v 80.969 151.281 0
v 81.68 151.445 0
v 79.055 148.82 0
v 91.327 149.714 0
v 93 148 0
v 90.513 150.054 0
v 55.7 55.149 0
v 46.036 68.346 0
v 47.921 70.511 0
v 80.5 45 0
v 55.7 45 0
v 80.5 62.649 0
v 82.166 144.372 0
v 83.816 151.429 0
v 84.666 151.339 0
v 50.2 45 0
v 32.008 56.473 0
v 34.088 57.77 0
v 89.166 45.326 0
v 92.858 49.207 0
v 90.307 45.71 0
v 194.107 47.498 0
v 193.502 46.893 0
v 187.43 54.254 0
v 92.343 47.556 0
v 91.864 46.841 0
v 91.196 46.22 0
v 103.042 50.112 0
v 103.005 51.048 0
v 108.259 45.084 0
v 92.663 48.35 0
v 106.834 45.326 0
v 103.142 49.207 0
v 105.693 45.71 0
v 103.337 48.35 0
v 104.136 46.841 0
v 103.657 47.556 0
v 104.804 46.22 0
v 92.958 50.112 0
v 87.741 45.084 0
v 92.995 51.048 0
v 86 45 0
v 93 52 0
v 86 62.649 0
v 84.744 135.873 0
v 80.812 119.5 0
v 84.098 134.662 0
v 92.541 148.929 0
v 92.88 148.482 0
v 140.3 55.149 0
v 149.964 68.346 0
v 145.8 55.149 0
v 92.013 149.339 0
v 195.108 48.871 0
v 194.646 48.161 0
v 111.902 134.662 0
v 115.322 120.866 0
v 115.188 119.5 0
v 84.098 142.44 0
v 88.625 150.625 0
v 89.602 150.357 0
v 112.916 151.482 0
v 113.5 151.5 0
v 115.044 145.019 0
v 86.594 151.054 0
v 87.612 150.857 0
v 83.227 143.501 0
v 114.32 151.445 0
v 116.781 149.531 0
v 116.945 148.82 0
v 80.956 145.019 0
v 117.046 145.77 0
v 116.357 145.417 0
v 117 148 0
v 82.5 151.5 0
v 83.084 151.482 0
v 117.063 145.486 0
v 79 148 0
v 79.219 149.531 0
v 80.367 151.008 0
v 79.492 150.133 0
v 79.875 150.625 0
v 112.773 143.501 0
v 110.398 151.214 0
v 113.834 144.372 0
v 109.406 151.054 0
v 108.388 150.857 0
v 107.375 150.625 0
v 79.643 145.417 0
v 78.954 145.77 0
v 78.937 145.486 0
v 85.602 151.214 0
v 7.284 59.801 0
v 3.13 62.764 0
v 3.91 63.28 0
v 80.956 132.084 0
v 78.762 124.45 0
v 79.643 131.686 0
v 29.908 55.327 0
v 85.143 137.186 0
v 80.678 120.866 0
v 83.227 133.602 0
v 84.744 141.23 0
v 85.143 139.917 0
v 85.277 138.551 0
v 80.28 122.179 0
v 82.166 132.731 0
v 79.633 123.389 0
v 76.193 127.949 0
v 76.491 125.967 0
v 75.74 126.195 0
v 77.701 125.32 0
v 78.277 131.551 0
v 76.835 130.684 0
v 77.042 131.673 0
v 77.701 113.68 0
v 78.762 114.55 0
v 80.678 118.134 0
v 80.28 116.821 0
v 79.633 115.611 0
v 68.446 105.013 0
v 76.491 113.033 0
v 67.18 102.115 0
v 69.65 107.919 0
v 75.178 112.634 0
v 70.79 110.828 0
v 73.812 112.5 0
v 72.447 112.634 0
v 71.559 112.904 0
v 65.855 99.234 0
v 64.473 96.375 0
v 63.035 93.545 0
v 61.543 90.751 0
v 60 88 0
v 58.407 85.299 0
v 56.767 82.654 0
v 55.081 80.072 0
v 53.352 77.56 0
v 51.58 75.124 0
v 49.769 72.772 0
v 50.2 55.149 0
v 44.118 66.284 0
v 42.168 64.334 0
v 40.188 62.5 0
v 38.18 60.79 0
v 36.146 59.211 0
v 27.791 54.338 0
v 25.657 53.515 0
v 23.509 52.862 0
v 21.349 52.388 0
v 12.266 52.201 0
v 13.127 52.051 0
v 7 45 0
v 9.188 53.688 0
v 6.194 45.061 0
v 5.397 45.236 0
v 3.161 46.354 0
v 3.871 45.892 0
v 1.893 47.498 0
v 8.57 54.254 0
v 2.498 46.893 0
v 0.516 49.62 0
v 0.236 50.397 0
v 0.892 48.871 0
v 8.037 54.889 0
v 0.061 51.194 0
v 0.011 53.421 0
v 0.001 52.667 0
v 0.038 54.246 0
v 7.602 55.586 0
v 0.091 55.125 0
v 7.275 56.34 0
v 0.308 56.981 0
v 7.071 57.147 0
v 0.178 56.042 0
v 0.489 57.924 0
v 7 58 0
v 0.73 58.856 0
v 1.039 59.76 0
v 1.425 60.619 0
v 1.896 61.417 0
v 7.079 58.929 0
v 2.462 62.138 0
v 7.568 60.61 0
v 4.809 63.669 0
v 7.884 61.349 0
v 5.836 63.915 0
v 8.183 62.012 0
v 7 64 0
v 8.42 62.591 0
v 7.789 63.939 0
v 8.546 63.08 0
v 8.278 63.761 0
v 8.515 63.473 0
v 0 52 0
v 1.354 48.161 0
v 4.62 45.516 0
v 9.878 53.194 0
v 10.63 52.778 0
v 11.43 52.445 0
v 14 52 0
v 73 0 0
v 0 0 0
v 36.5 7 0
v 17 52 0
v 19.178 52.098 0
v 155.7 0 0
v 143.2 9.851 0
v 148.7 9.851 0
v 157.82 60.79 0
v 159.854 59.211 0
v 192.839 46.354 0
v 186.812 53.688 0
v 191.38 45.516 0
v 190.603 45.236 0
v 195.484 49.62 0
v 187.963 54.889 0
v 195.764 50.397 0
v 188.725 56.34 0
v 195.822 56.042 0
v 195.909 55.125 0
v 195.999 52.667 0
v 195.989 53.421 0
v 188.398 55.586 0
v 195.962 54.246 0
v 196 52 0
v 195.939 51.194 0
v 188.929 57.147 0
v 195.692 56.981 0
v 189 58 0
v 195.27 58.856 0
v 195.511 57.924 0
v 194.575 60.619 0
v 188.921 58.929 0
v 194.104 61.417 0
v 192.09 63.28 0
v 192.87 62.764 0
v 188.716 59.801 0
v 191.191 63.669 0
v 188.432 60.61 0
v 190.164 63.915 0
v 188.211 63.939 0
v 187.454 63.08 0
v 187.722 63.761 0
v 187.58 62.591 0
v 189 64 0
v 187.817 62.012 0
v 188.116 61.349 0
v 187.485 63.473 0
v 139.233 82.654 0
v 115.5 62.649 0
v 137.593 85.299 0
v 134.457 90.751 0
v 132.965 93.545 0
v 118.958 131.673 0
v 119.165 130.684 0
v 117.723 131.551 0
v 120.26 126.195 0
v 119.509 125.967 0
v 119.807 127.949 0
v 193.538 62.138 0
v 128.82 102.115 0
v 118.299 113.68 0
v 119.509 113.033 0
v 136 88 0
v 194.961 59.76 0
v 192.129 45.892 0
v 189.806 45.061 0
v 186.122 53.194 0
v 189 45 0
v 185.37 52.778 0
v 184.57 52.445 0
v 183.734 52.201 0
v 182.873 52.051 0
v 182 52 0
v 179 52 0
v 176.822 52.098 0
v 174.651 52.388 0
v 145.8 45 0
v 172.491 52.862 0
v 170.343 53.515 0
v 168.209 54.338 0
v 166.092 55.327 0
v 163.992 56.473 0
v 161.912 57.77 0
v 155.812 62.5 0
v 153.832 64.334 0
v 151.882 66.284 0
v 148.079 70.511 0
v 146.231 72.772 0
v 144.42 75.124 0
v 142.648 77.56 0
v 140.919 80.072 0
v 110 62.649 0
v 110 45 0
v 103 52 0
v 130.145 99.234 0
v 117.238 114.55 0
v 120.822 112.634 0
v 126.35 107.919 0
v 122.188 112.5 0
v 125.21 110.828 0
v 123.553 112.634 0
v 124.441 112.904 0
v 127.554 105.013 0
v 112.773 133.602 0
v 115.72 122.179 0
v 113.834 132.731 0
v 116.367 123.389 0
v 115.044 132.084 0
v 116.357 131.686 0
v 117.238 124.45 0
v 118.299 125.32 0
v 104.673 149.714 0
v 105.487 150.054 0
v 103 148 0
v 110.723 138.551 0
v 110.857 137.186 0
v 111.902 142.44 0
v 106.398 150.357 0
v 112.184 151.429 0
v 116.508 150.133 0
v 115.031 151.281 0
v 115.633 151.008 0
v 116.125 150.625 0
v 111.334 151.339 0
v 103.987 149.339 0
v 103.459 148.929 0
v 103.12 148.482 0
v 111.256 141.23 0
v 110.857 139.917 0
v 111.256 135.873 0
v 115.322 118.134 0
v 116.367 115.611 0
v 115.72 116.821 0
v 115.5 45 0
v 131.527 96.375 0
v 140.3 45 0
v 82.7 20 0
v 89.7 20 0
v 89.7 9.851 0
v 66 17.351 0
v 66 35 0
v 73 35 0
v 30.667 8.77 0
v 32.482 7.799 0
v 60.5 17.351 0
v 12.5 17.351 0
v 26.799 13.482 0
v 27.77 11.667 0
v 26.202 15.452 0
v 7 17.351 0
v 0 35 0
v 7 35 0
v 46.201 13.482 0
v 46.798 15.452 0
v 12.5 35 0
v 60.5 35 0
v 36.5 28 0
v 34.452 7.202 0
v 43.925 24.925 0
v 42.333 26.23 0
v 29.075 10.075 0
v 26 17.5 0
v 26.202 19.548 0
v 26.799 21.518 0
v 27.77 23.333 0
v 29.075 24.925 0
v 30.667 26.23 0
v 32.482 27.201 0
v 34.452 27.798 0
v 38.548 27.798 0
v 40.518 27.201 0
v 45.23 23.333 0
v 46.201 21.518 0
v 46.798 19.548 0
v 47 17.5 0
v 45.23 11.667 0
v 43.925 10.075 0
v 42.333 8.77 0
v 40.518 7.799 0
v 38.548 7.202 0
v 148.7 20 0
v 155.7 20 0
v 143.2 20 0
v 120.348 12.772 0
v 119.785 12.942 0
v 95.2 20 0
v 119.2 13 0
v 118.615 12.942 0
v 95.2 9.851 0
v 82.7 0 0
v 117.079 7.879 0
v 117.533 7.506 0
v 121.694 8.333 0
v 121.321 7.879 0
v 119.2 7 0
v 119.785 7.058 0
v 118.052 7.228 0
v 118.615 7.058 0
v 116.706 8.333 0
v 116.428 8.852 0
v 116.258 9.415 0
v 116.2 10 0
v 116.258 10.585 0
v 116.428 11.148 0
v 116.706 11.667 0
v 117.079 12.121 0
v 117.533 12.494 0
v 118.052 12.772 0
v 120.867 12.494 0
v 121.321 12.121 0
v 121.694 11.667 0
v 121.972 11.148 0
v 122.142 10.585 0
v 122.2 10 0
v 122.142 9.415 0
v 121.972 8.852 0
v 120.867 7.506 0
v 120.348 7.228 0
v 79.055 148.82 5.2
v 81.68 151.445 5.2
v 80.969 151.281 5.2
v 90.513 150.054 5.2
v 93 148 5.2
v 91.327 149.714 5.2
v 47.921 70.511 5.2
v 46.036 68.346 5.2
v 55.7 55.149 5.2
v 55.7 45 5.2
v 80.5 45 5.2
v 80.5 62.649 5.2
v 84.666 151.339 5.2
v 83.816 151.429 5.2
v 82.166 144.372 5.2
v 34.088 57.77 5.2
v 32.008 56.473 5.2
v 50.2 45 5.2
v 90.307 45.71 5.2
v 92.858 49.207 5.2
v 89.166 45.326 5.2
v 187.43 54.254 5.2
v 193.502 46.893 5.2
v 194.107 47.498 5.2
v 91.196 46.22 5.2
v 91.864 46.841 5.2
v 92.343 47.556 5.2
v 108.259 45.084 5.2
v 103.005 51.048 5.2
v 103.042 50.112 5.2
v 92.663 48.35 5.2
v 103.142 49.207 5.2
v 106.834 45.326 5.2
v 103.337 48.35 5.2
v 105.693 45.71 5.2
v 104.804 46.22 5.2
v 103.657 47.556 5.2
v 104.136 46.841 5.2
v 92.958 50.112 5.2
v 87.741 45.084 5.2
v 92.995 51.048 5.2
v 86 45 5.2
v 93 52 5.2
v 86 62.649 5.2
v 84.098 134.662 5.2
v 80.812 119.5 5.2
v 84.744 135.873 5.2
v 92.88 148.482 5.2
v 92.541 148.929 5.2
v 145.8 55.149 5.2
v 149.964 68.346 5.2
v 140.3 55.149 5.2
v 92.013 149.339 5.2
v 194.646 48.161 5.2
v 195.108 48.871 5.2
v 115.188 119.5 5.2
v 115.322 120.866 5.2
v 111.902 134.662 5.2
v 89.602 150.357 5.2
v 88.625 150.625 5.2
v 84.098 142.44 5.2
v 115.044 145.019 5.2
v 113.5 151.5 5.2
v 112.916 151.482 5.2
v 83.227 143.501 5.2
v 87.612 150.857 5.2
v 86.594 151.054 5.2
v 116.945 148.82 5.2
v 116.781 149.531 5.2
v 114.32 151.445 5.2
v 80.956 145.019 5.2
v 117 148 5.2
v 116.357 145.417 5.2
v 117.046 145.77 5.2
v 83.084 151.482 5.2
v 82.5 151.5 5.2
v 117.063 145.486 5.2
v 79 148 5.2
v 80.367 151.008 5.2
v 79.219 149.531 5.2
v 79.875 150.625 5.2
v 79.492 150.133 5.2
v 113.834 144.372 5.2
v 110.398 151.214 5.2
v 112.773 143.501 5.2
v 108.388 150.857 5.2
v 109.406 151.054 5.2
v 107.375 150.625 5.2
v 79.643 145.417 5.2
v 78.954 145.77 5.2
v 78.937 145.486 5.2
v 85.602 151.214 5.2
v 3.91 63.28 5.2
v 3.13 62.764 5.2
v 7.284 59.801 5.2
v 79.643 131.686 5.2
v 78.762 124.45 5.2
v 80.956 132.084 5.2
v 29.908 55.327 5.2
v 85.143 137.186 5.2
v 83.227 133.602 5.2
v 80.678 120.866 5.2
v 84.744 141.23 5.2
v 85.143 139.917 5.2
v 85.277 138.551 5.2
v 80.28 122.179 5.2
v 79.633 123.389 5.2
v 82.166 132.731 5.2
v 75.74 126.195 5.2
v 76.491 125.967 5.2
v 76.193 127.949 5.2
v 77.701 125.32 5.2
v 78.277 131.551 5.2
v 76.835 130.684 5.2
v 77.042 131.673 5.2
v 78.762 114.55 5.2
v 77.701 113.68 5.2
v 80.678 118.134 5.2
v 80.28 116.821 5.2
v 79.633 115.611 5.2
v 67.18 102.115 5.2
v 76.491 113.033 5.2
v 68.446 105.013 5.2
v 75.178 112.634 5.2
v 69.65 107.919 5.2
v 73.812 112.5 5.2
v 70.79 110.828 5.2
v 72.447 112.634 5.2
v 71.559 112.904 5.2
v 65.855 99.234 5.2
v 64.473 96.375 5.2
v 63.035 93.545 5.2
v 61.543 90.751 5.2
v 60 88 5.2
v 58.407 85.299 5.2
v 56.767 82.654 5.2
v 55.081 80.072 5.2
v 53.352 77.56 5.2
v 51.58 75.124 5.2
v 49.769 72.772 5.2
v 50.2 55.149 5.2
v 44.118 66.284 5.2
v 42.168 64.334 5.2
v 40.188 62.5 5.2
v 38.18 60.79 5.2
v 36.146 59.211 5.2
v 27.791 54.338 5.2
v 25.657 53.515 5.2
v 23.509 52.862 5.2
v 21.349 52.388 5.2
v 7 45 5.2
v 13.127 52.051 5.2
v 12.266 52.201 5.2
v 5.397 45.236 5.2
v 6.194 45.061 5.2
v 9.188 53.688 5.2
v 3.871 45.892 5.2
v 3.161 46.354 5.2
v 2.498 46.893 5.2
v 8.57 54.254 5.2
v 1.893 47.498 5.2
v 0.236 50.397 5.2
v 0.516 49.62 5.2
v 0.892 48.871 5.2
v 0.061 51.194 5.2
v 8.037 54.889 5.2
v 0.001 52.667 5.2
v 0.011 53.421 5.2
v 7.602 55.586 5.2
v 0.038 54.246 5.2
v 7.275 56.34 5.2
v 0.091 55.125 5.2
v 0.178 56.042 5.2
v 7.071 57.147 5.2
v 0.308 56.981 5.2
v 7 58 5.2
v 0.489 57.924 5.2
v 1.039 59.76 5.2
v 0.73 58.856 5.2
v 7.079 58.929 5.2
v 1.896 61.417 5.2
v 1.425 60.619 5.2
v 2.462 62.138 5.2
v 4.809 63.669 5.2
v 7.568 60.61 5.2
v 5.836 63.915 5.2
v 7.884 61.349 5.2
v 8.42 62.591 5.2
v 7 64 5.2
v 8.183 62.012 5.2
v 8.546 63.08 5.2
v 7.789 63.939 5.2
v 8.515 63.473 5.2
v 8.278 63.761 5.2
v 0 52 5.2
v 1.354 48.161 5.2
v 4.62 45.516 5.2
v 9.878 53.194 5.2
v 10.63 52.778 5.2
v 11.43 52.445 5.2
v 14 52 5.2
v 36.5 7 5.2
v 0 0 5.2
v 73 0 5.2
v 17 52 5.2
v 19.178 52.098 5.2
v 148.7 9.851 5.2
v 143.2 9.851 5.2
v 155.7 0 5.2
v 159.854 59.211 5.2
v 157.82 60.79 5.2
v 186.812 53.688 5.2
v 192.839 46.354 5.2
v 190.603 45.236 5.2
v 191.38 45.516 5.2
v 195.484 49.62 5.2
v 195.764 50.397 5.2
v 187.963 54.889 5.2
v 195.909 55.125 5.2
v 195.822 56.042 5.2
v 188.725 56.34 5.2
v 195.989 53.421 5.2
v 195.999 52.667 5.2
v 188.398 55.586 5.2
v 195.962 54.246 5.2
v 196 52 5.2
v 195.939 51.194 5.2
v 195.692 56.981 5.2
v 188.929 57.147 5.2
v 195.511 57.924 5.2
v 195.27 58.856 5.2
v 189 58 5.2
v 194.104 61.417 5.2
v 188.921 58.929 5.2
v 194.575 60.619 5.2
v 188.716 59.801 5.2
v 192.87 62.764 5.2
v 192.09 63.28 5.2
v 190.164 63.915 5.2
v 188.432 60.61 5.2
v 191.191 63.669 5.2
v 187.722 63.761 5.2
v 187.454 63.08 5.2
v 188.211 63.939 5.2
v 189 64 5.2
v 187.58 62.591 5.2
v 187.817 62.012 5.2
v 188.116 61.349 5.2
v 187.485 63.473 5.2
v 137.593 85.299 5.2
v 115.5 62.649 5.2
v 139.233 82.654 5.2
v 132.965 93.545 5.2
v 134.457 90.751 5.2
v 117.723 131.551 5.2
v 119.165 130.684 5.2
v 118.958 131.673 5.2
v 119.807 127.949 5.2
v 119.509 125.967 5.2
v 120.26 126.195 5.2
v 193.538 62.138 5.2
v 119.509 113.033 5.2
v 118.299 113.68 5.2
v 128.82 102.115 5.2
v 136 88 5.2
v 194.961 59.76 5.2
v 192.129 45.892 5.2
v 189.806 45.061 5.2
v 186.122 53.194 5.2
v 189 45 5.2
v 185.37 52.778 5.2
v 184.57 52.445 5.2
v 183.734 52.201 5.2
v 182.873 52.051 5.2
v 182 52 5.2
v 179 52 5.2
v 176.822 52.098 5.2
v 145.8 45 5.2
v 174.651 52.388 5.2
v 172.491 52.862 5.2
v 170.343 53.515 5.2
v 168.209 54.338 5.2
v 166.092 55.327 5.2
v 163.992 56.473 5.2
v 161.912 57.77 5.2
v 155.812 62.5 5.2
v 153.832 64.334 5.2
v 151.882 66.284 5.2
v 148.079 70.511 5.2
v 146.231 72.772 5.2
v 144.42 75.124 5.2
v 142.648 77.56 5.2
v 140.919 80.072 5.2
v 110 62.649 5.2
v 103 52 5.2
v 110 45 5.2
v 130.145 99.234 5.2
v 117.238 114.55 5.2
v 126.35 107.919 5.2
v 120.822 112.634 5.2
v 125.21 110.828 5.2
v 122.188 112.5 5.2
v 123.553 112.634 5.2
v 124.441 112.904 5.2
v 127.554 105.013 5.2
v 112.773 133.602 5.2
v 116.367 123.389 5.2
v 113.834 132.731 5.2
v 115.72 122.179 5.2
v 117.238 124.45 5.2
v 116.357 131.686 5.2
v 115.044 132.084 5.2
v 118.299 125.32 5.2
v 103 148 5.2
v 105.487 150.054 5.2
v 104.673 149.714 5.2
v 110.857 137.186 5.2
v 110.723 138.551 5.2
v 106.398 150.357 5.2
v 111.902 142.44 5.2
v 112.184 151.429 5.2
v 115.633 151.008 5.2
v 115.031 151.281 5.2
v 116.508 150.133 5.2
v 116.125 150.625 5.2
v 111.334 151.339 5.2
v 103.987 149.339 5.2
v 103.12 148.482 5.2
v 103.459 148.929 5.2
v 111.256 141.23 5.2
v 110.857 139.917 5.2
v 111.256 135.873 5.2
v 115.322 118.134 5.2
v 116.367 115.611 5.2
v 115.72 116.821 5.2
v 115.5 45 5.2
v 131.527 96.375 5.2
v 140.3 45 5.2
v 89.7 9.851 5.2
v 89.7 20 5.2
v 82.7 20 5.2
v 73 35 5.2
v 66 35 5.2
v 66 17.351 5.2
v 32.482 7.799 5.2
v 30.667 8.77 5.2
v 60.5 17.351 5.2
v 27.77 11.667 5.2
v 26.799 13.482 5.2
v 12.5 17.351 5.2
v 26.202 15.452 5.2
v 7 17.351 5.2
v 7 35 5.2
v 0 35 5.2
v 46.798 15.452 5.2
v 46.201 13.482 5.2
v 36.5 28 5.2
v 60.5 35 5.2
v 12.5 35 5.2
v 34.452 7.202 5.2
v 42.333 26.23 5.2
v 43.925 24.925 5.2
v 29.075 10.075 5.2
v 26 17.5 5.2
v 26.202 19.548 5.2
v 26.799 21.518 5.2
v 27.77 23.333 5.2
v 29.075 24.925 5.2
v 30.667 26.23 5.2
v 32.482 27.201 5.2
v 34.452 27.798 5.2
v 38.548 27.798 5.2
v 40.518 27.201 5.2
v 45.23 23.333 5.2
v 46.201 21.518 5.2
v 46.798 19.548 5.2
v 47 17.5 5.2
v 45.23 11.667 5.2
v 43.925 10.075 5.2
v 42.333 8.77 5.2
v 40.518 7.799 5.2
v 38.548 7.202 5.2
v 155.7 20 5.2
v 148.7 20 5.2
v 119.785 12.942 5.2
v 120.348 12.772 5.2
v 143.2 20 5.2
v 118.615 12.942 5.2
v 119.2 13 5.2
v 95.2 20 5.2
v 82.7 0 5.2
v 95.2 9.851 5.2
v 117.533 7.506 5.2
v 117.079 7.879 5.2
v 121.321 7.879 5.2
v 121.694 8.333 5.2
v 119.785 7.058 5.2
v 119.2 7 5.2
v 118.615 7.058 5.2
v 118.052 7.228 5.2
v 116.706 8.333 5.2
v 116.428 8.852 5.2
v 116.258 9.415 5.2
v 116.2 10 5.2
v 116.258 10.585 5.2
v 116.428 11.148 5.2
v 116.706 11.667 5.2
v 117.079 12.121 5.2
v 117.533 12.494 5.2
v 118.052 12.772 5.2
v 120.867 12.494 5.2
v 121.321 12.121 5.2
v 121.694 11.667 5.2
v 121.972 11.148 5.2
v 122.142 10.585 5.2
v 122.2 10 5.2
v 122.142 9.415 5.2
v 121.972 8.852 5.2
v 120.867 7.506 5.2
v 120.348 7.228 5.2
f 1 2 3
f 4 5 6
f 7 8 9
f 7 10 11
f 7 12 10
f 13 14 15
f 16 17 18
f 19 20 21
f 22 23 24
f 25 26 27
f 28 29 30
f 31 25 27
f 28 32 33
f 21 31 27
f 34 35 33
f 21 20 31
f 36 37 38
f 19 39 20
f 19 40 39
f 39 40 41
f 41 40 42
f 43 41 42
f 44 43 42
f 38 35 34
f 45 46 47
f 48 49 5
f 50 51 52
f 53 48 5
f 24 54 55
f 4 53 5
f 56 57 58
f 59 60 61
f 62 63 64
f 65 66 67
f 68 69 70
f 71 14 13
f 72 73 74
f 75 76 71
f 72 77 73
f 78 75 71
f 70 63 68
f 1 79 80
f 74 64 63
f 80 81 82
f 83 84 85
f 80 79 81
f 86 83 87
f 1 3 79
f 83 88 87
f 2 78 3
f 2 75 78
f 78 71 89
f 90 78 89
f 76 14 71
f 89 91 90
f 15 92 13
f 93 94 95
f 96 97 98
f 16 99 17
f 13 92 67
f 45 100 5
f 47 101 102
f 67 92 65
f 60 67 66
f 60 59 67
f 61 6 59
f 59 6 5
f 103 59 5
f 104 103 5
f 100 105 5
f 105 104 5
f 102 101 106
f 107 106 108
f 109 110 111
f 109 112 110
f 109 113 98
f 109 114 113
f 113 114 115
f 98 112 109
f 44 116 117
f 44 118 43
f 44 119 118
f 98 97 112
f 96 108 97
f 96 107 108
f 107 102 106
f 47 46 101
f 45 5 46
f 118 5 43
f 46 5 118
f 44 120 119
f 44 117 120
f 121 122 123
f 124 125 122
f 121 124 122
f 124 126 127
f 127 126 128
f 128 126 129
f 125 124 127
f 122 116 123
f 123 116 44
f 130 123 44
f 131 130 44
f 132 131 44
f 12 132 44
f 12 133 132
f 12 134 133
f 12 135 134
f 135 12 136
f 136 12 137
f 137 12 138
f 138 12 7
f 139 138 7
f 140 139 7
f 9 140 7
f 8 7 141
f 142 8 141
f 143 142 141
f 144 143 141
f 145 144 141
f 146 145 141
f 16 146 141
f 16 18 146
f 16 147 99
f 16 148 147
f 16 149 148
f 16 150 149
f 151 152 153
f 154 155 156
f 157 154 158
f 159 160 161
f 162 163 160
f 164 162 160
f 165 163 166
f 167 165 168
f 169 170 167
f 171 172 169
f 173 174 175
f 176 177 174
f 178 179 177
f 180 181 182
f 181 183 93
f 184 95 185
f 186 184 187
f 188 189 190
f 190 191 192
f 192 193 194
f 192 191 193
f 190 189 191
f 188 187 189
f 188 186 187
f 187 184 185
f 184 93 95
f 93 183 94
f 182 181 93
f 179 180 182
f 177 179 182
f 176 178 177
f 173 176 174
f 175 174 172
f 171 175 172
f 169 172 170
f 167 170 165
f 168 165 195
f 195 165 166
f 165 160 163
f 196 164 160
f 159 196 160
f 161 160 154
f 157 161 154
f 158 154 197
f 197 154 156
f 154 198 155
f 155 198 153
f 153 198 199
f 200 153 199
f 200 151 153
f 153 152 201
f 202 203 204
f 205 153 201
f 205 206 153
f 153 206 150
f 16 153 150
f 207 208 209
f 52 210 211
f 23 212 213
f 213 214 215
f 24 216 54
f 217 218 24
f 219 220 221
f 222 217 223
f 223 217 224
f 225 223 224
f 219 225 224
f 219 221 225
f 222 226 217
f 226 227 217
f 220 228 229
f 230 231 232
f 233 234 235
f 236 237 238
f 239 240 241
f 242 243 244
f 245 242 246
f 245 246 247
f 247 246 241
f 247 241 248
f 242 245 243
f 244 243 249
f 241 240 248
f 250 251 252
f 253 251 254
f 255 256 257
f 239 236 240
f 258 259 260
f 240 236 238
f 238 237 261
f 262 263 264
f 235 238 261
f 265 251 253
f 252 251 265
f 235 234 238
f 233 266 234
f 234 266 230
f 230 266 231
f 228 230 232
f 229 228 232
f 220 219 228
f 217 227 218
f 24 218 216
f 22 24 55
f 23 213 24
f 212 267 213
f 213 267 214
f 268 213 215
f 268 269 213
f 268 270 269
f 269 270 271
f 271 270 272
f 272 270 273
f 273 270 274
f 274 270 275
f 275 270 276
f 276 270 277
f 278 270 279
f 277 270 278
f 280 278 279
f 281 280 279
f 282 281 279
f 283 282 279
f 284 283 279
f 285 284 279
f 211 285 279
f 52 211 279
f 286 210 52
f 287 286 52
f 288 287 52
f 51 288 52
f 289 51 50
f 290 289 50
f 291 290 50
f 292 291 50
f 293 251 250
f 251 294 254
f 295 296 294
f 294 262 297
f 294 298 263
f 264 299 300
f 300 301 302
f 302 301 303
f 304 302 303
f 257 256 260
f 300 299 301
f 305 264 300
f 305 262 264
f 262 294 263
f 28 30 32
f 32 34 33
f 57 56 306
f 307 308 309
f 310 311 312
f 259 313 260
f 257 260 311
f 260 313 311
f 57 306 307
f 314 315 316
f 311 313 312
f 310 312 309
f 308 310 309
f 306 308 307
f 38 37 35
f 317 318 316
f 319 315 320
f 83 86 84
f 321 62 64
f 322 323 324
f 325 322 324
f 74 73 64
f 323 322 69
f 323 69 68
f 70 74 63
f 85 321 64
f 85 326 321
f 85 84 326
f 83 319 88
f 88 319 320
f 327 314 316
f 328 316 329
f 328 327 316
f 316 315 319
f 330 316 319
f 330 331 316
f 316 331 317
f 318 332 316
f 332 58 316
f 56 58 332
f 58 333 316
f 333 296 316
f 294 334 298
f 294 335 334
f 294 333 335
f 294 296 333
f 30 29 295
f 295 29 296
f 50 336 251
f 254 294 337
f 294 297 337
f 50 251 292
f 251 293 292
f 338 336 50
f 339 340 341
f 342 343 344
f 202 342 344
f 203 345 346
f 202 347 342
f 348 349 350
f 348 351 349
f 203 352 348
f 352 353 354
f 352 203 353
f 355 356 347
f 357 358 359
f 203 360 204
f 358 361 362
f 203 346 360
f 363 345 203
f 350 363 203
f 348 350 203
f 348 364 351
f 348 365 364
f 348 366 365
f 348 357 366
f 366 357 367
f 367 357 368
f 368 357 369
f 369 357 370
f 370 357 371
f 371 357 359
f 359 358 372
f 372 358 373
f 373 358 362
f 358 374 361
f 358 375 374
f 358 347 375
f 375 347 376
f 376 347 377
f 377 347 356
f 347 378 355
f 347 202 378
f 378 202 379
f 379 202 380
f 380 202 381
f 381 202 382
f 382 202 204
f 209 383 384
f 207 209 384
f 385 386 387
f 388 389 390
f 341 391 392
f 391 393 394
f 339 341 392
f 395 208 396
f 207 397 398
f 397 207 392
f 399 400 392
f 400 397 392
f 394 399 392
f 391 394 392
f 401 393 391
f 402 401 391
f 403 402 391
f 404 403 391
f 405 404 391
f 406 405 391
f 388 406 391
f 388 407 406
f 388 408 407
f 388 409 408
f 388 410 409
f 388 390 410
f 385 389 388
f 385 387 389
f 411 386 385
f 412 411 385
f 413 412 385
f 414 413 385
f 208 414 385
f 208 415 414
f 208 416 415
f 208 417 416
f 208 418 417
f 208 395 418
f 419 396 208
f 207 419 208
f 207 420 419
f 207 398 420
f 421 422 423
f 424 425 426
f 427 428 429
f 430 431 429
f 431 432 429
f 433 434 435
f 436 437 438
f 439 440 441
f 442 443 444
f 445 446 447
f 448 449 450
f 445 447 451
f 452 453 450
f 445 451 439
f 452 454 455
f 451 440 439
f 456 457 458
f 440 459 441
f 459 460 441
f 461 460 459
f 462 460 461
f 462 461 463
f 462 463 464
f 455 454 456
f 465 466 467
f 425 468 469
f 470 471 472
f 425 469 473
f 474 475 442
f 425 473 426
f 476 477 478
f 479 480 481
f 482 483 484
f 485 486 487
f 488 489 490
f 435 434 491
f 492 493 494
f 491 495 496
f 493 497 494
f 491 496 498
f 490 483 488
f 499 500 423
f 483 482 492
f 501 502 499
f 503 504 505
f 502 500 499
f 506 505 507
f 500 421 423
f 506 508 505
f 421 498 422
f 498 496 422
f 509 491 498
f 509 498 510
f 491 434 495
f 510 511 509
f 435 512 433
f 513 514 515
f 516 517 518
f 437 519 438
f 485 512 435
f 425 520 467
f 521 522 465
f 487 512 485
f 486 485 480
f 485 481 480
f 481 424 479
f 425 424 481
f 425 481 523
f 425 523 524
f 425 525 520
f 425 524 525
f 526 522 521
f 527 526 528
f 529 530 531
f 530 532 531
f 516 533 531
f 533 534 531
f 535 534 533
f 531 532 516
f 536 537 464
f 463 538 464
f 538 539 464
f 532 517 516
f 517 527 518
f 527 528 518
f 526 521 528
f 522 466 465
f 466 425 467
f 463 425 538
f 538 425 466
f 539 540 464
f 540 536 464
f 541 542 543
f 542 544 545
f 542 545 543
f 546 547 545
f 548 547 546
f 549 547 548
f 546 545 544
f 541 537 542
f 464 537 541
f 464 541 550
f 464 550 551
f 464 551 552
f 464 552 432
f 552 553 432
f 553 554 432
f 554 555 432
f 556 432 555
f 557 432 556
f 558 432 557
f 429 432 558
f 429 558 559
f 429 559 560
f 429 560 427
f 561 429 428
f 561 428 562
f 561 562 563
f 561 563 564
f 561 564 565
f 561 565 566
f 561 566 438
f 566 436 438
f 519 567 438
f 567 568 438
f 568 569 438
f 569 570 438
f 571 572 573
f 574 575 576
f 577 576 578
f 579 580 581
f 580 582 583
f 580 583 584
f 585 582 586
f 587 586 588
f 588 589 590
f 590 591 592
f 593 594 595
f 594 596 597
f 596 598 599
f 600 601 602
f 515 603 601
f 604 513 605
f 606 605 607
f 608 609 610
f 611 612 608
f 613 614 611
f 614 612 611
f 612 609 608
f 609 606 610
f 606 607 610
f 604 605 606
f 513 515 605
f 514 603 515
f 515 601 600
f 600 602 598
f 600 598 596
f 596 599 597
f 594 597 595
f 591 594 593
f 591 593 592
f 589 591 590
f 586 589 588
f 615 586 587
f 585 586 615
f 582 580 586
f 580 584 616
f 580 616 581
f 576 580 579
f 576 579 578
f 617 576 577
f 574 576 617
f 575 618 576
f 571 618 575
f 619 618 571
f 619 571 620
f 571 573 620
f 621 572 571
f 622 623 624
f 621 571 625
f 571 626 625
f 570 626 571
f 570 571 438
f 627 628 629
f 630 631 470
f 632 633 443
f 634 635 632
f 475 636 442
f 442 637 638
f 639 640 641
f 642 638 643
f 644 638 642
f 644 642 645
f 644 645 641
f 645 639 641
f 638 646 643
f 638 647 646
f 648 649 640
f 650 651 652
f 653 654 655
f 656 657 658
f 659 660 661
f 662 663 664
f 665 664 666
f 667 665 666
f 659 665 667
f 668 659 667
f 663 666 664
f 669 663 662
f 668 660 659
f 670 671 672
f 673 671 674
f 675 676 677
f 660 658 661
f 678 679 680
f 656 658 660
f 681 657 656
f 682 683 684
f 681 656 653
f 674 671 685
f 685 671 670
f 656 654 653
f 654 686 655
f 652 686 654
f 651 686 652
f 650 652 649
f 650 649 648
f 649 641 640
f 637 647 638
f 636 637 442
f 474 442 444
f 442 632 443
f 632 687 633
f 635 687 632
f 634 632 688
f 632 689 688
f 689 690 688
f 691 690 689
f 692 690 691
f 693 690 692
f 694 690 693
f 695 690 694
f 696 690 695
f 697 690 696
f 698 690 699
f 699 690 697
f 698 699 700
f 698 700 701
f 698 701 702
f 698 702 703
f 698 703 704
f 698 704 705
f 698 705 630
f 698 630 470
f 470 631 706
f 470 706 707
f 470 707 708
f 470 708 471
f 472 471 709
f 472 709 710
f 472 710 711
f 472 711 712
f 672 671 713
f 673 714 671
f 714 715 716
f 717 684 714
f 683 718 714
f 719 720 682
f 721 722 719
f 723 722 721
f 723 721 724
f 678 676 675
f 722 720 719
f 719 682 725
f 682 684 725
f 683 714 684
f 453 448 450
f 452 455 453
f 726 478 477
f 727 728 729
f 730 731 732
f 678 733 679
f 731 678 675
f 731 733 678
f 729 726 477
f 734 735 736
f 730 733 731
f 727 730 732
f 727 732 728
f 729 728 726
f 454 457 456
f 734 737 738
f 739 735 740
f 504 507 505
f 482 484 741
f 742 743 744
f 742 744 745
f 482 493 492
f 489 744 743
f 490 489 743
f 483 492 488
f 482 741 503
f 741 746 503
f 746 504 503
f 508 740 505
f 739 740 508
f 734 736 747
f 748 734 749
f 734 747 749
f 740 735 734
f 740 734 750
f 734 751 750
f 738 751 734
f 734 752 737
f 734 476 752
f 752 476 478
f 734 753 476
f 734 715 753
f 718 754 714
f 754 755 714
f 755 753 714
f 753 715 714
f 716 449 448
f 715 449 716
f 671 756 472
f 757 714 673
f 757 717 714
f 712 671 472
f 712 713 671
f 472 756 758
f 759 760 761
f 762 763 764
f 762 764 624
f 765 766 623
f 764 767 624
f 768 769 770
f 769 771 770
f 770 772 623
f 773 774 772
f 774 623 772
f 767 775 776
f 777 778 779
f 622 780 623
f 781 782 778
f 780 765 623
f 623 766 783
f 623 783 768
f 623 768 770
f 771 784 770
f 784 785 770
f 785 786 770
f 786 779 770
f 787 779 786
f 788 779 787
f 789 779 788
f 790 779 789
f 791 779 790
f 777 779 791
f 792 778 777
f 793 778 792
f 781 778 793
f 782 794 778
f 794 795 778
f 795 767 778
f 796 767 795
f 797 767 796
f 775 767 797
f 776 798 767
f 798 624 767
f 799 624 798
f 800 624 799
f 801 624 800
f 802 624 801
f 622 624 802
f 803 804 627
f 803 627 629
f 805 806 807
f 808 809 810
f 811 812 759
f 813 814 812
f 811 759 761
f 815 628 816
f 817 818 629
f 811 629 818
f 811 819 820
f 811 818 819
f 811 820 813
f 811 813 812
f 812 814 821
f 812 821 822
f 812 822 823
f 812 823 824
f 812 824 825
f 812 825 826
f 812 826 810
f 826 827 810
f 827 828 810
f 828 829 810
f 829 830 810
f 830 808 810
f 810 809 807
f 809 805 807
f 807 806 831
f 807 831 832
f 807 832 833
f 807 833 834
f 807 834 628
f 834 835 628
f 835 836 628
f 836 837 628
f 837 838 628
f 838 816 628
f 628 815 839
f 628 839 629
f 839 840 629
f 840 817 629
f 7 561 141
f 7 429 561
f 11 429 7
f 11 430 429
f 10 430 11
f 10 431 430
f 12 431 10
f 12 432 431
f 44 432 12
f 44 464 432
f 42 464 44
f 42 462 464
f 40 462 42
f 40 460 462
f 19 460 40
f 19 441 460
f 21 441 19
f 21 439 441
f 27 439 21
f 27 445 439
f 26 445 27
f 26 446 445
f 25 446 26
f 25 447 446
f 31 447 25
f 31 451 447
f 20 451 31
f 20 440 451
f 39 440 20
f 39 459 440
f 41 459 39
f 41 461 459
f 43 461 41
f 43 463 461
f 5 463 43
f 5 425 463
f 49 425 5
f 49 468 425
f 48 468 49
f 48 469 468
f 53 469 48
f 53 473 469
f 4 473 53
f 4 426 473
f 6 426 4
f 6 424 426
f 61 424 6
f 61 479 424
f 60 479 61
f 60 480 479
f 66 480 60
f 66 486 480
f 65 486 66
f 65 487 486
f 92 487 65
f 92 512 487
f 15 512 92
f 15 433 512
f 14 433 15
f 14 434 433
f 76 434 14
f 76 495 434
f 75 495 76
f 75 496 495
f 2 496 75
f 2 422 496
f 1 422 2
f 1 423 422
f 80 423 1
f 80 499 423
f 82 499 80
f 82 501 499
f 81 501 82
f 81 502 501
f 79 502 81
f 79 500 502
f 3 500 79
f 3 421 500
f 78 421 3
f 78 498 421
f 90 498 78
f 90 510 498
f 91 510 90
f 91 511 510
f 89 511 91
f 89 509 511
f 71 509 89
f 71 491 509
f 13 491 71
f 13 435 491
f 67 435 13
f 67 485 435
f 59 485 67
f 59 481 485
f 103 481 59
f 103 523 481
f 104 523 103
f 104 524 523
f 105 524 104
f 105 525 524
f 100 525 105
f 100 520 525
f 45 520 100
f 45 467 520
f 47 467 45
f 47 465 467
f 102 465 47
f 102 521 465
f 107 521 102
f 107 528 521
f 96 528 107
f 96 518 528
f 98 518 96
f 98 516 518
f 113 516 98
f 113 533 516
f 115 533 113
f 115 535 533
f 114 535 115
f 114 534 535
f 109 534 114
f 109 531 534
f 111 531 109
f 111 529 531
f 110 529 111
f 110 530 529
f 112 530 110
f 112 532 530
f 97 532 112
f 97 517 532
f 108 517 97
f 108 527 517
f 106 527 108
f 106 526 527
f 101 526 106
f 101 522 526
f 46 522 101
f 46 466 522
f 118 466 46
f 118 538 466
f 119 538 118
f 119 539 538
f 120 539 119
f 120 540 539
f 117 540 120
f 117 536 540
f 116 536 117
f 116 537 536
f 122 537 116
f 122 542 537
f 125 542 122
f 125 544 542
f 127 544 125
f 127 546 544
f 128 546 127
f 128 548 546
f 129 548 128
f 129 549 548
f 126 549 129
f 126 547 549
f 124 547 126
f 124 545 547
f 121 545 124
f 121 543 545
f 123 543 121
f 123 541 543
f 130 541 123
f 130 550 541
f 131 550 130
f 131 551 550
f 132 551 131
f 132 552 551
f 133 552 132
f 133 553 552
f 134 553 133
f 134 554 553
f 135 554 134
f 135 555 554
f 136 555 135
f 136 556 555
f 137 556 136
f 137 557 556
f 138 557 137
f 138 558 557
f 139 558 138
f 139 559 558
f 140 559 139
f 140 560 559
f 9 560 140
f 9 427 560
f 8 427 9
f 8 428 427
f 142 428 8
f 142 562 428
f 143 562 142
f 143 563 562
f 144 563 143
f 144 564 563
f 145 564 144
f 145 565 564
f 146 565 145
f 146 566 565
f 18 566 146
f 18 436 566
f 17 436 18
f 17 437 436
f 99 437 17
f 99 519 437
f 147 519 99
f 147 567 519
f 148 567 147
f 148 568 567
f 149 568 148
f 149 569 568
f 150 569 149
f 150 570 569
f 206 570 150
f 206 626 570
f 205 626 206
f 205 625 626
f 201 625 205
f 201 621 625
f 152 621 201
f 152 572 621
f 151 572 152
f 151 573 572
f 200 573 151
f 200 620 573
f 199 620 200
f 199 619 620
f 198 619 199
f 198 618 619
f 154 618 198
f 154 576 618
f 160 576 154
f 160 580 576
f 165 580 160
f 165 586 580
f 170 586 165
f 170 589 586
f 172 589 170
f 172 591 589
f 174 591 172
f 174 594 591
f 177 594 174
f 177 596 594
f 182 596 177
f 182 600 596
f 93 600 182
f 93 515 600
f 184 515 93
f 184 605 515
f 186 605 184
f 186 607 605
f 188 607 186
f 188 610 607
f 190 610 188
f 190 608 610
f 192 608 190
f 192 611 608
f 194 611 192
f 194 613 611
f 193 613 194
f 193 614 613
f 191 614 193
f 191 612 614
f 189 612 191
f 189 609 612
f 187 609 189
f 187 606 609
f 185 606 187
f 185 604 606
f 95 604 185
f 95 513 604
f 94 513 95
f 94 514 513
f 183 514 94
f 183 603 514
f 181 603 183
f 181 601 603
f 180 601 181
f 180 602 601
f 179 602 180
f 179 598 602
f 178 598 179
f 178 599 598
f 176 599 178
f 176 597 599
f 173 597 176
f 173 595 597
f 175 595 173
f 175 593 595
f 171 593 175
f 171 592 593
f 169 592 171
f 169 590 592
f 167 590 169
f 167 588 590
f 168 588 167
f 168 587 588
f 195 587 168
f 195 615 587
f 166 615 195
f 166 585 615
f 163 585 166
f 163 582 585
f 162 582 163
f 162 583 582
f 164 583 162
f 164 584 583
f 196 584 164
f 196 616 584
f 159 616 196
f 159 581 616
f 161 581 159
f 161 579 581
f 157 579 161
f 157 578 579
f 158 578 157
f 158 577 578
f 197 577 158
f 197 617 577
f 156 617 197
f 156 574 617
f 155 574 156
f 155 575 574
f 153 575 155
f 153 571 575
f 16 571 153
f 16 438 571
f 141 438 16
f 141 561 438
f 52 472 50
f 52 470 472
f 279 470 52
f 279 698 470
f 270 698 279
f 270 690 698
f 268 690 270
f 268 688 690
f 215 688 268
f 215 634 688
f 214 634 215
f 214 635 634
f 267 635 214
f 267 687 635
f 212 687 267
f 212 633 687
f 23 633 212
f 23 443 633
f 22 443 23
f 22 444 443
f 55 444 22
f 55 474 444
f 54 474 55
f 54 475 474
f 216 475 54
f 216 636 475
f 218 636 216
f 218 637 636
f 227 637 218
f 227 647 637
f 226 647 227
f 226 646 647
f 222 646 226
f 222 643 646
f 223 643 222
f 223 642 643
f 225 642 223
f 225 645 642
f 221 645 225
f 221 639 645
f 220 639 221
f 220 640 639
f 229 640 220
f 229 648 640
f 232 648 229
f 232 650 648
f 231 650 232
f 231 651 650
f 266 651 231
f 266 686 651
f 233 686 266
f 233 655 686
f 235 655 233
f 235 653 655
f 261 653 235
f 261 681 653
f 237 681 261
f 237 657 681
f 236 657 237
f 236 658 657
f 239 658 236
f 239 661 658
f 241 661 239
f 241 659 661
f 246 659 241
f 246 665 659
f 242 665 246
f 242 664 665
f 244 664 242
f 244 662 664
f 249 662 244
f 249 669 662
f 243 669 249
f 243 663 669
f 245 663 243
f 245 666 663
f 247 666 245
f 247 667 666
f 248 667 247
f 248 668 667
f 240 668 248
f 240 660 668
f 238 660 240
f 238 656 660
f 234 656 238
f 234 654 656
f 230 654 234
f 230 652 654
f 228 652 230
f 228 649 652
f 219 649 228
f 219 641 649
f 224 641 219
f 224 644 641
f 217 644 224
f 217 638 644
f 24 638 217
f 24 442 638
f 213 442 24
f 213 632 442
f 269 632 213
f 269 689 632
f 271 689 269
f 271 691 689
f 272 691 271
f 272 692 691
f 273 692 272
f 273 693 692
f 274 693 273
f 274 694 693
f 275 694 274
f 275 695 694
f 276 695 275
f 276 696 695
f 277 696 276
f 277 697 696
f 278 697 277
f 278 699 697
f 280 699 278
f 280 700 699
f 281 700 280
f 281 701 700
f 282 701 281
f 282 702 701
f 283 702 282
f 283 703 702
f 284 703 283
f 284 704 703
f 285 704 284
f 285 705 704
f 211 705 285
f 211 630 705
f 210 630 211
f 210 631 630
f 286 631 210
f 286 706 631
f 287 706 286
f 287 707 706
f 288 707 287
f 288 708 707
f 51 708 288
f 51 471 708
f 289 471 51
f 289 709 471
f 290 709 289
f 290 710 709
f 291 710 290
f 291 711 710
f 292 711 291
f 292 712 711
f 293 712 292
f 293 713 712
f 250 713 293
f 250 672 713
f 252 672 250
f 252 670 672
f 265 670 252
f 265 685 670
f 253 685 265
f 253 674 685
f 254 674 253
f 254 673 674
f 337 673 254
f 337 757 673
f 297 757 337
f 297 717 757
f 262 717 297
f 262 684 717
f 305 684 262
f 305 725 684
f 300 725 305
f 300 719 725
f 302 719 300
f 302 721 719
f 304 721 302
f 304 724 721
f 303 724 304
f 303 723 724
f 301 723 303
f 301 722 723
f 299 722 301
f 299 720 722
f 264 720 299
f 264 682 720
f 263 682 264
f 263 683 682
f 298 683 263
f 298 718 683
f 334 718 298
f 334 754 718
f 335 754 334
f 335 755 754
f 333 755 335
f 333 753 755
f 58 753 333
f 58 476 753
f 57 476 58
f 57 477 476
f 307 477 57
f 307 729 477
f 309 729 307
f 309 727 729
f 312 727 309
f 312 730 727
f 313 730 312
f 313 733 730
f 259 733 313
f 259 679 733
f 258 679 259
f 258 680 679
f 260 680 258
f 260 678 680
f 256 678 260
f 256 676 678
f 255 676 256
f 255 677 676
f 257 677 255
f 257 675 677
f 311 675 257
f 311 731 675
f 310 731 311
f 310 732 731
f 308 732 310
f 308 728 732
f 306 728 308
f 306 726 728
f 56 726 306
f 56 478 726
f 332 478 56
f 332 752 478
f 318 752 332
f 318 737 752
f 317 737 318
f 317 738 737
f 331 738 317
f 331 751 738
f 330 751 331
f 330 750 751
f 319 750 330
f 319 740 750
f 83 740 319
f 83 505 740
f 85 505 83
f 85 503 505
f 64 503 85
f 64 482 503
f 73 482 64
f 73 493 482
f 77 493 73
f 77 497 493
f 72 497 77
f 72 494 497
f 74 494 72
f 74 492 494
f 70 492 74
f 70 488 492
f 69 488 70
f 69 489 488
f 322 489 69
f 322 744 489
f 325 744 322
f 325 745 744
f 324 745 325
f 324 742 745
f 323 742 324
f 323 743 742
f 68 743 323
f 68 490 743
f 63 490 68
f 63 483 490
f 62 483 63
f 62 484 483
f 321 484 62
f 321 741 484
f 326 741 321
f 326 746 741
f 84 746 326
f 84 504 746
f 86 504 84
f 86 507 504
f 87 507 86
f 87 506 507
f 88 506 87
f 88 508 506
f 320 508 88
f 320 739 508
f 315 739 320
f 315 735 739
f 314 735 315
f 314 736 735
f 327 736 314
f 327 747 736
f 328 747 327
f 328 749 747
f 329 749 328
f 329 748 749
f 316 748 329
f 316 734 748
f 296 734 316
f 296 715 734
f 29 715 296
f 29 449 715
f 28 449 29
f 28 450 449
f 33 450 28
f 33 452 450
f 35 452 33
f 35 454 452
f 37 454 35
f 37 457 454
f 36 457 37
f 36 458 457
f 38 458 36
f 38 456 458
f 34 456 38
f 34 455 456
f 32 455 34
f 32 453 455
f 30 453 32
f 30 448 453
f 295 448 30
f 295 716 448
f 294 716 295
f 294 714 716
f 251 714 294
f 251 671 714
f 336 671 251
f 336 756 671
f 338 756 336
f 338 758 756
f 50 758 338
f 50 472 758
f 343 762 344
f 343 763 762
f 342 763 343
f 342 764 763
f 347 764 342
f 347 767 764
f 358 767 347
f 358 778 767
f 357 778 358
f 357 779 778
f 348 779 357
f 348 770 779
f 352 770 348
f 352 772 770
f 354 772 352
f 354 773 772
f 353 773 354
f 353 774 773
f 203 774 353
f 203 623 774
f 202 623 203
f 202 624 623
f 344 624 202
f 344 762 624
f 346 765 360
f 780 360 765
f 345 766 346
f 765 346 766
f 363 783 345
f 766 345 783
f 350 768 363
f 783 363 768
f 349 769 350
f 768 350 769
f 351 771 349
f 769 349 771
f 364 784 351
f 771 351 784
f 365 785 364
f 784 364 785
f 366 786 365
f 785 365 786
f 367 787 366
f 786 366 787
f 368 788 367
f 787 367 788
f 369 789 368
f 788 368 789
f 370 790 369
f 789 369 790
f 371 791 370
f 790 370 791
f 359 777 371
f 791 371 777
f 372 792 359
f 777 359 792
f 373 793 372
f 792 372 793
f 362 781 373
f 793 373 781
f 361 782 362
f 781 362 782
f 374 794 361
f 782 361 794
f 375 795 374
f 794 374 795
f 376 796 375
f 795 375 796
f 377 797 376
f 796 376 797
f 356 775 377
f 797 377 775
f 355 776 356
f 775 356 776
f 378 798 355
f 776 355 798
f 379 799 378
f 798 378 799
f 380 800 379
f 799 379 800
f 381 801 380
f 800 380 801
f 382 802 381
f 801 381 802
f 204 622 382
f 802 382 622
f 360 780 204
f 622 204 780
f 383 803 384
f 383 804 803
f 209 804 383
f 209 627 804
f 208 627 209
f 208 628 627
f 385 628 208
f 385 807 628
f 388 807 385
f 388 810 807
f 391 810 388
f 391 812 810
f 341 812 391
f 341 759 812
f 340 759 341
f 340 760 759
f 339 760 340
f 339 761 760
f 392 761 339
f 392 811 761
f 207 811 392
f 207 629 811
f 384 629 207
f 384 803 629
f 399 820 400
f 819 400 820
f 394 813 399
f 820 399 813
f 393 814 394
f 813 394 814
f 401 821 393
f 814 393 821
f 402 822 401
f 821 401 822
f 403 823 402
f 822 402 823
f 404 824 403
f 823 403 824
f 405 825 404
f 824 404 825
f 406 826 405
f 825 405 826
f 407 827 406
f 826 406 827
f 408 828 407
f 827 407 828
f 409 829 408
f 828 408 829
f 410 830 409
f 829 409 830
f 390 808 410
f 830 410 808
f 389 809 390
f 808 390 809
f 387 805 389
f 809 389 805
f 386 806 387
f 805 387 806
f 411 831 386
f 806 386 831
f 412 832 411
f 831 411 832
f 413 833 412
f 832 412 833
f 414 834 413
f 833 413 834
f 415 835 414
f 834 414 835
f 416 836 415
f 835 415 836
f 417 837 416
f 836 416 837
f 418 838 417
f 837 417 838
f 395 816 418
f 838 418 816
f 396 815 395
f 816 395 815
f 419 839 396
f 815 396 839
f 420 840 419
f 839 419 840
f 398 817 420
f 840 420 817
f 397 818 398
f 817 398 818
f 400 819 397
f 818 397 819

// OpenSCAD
additive = true;
includeSides = 2; //[0:0, 1:1, 2:2]
includeSupports = true;
tolerance = 0.15;
bottomSpacing = 10;
minWidth = 7;
lip = 12;
depth = 72;
height = 96;
thickness = 5.2;
supportHeight1 = 35;
supportHeight2 = 20;
supportSpacing = 48;
extraTroughs = 2;
troughDepth = 7;

module end_of_parameters_dummy() {}


//BEGIN: use <Bezier.scad>;
/*
Copyright (c) 2017 Alexander R. Pruss.

Licensed under any Creative Commons Attribution license you like or under the
following MIT License.

Permission is hereby granted, free of charge, to any person obtaining a copy
of this software and associated documentation files (the "Software"), to deal
in the Software without restriction, including without limitation the rights
to use, copy, modify, merge, publish, distribute, sublicense, and/or sell
copies of the Software, and to permit persons to whom the Software is
furnished to do so, subject to the following conditions:

The above copyright notice and this permission notice shall be included in all
copies or substantial portions of the Software.

THE SOFTWARE IS PROVIDED "AS IS", WITHOUT WARRANTY OF ANY KIND, EXPRESS OR
IMPLIED, INCLUDING BUT NOT LIMITED TO THE WARRANTIES OF MERCHANTABILITY,
FITNESS FOR A PARTICULAR PURPOSE AND NONINFRINGEMENT. IN NO EVENT SHALL THE
AUTHORS OR COPYRIGHT HOLDERS BE LIABLE FOR ANY CLAIM, DAMAGES OR OTHER
LIABILITY, WHETHER IN AN ACTION OF CONTRACT, TORT OR OTHERWISE, ARISING FROM,
OUT OF OR IN CONNECTION WITH THE SOFTWARE OR THE USE OR OTHER DEALINGS IN THE
SOFTWARE.

*/


// Public domain Bezier stuff from www.thingiverse.com/thing:8443
function BEZ03(u) = pow(1-u, 3);
function BEZ13(u) = 3*u*pow(1-u,2);
function BEZ23(u) = 3*pow(u,2)*(1-u);
function BEZ33(u) = pow(u,3);
function PointAlongBez4(p0, p1, p2, p3, u) =
	BEZ03(u)*p0+BEZ13(u)*p1+BEZ23(u)*p2+BEZ33(u)*p3;
// End public domain Bezier stuff
function d2BEZ03(u) = 6*(1-u);
function d2BEZ13(u) = 18*u-12;
function d2BEZ23(u) = -18*u+6;
function d2BEZ33(u) = 6*u;

function worstCase2ndDerivative(p0, p1, p2, p3, u1, u2)
    = norm([
        for(i=[0:len(p0)-1])
            max([for(u=[u1,u2])
                d2BEZ03(u)*p0[i]+d2BEZ13(u)*p1[i]+
                d2BEZ23(u)*p2[i]+d2BEZ33(u)*p3[i]]) ]);

function neededIntervalLength(p0,p1,p2,p3,u1,u2,tolerance)
    = let(d2=worstCase2ndDerivative(p0,p1,p2,p3,u1,u2))
        d2==0 ? u2-u1+1 : sqrt(2*tolerance/d2);

function REPEAT_MIRRORED(v,angleStart=0,angleEnd=360) = ["m",v,angleStart,angleEnd];
function SMOOTH_REL(x) = ["r",x];
function SMOOTH_ABS(x) = ["a",x];
function SYMMETRIC() = ["r",1];
function OFFSET(v) = ["o",v];
function SHARP() = OFFSET([0,0,0]);
function LINE() = ["l",0];
function POLAR(r,angle) = OFFSET(r*[cos(angle),sin(angle)]);
function POINT_IS_SPECIAL(v) = (v[0]=="r" || v[0]=="a" || v[0]=="o" || v[0]=="l");

// this does NOT handle offset type points; to handle those, use DecodeBezierOffsets()
function getControlPoint(cp,node,otherCP,otherNode,nextNode) =
    let(v=node-otherCP) (
    cp[0]=="r" ? node+cp[1]*v:
    cp[0]=="a" ? (
        norm(v)<1e-9 ? node+cp[1]*(node-otherNode)/norm(node-otherNode) : node+cp[1]*v/norm(v) ) :
    cp[0]=="l" ? (2*node+nextNode)/3 :
        cp );

function onLine2(a,b,c,eps=1e-4) =
    norm(c-a) <= eps ? true
        : norm(b-a) <= eps ? false /* to be safe */
            : abs((c[1]-a[1])*(b[0]-a[0]) - (b[1]-a[1])*(c[0]-a[0])) <= eps * eps && norm(c-a) <= eps + norm(b-a);

function isStraight2(p1,c1,c2,p2,eps=1e-4) =
    len(p1) == 2 &&
    onLine2(p1,p2,c1,eps=eps) && onLine2(p2,p1,c2,eps=eps);

function Bezier2(p,index=0,precision=0.05,rightEndPoint=true,optimize=true) = let(nPoints=
        max(1, precision < 0 ?
                    ceil(1/
                        neededIntervalLength(p[index],p[index+1],p[index+2],p[index+3],0,1,-precision))
                    : ceil(1/precision)) )
    optimize && isStraight2(p[index],p[index+1],p[index+2],p[index+3]) ? (rightEndPoint?[p[index+0],p[index+3]]:[p[index+0]] ) :
    [for (i=[0:nPoints-(rightEndPoint?0:1)]) PointAlongBez4(p[index+0],p[index+1],p[index+2],p[index+3],i/nPoints)];

function flatten(listOfLists) = [ for(list = listOfLists) for(item = list) item ];


// p is a list of points, in the format:
// [node1,control1,control2,node2,control3, control4,node3, ...]
// You can replace inner control points with:
//   SYMMETRIC: uses a reflection of the control point on the other side of the node
//   SMOOTH_REL(x): like SYMMETRIC, but the distance of the control point to the node is x times the distance of the other control point to the node
//   SMOOTH_ABS(x): like SYMMETRIC, but the distance of the control point to the node is exactly x
// You can also replace any control point with:
//   OFFSET(v): puts the control point at the corresponding node plus the vector v
//   SHARP(): equivalent to OFFSET([0,0])
//   LINE(): when used for both control points between two nodes, generates a straight line
//   POLAR(r,angle): like OFFSET, except the offset is specified in polar coordinates

function DecodeBezierOffset(control,node) = control[0] == "o" ? node+control[1] : control;

function _mirrorMatrix(normalVector) = let(v = normalVector/norm(normalVector)) len(v)<3 ? [[1-2*v[0]*v[0],-2*v[0]*v[1]],[-2*v[0]*v[1],1-2*v[1]*v[1]]] : [[1-2*v[0]*v[0],-2*v[0]*v[1],-2*v[0]*v[2]],[-2*v[0]*v[1],1-2*v[1]*v[1],-2*v[1]*v[2]],[-2*v[0]*v[2],-2*v[1]*v[2],1-2*v[2]*v[2]]];

function _correctLength(p,start=0) =
    start >= len(p) || p[start][0] == "m" ? 3*floor(start/3)+1 : _correctLength(p,start=start+1);

function _trimArray(a, n) = [for (i=[0:n-1]) a[i]];

function _transformPoint(matrix,a) =
    let(n=len(a))
        len(matrix[0])==n+1 ?
            _trimArray(matrix * concat(a,[1]), n)
            : matrix * a;

function _transformPath(matrix,path) =
    [for (a=path) _transformPoint(matrix,a)];

function _reverseArray(array) = let(n=len(array)) [for (i=[0:n-1]) array[n-1-i]];

function _stitchPaths(a,b) = let(na=len(a)) [for (i=[0:na+len(b)-2]) i<na? a[i] : b[i-na+1]-b[0]+a[na-1]];

// replace all OFFSET/SHARP/POLAR points with coordinates
function DecodeBezierOffsets(p) = [for (i=[0:_correctLength(p)-1]) i%3==0?p[i]:(i%3==1?DecodeBezierOffset(p[i],p[i-1]):DecodeBezierOffset(p[i],p[i+1]))];

function _mirrorPaths(basePath, control, start) =
    control[start][0] == "m" ? _mirrorPaths(_stitchPaths(basePath,_reverseArray(_transformPath(_mirrorMatrix( control[start][1] ),basePath))), control, start+1) : basePath;

function DecodeSpecialBezierPoints(p0) =
    let(
        l = _correctLength(p0),
        doMirror = len(p0)>l && p0[l][0] == "m",
        p=DecodeBezierOffsets(p0),
        basePath = [for (i=[0:l-1]) i%3==0?p[i]:(i%3==1?getControlPoint(p[i],p[i-1],p[i-2],p[i-4],p[i+2]):getControlPoint(p[i],p[i+1],p[i+2],p[i+4],p[i-2]))])
        doMirror ? _mirrorPaths(basePath, p0, l) : basePath;

function Distance2D(a,b) = sqrt((a[0]-b[0])*(a[0]-b[0])+(a[1]-b[1])*(a[1]-b[1]));

function RemoveDuplicates(p,eps=0.00001) = let(safeEps = eps/len(p)) [for (i=[0:len(p)-1]) if(i==0 || i==len(p)-1 || Distance2D(p[i-1],p[i]) >= safeEps) p[i]];

function Bezier(p,precision=0.05,eps=0.00001,optimize=true) = let(q=DecodeSpecialBezierPoints(p), nodes=(len(q)-1)/3) RemoveDuplicates(flatten([for (i=[0:nodes-1]) Bezier2(q,optimize=optimize,index=i*3,precision=precision,rightEndPoint=(i==nodes-1))]),eps=eps);

function GetSplineAngle(a,b,c) =
    a==c && b==a ? 0 :
    a==c ? let(ba=b-a) atan2(ba[1],ba[0]) :
    let(ca=c-a) atan2(ca[1],ca[0]);

/*    let(ba=norm(b-a),cb=norm(c-b))
        ba == 0 && cb == 0 ? 0 :
    let(v = ba == 0 ? c-b :
            cb == 0 ? b-a :
            (c-b)*norm(b-a)/norm(c-b)+(b-a))
    atan2(v[1],v[0]); */

// do a spline around b
function SplineAroundPoint(a,b,c,tension=0.5,includeLeftCP=true,includeRightCP=true) =
    includeLeftCP && includeRightCP ?
        [POLAR(tension*norm(a-b),GetSplineAngle(c,b,a)),b,POLAR(tension*norm(c-b),GetSplineAngle(a,b,c))] :
    includeLeftCP ?
        [POLAR(tension*norm(a-b),GetSplineAngle(c,b,a)),b] :
    includeRightCP ?
        [b,POLAR(tension*norm(c-b),GetSplineAngle(a,b,c))] :
        [b];

function BezierSmoothPoints(points,tension=0.5,closed=false)
    = let (n=len(points))
        flatten(
        closed ? [ for (i=[0:n]) SplineAroundPoint(points[(n+i-1)%n],points[i%n],points[(i+1)%n],tension=tension,includeLeftCP=i>0,includeRightCP=i<n) ] :
        [ for (i=[0:n-1])
            SplineAroundPoint(
            i==0 ? 2*points[0]-points[1] : points[(n+i-1)%n],
            points[i],
            i==n-1 ? 2*points[n-1]-points[n-2] : points[(i+1)%n],tension=tension,includeLeftCP=i>0,includeRightCP=i<n-1  ) ]);

module BezierVisualize(p,precision=0.05,eps=0.00001,lineThickness=0.25,controlLineThickness=0.125,nodeSize=1) {
    $fn = 16;
    dim = len(p[0]);
    module point(size) {
        if (dim==2)
            circle(d=size);
        else
            sphere(d=size);
    }
    p1 = DecodeSpecialBezierPoints(p);
    l = Bezier(p1,precision=precision,eps=eps);
    for (i=[0:len(l)-2]) {
        hull() {
            translate(l[i]) point(lineThickness);
            translate(l[i+1]) point(lineThickness);
        }
    }
    for (i=[0:len(p1)-1]) {
        if (i%3 == 0) {
            color("black") translate(p1[i]) point(nodeSize);
        }
        else {
            node = i%3 == 1 ? i-1 : i+1;
            color("red") translate(p1[i]) point(nodeSize);
            color("red") hull() {
                translate(p1[node]) point(controlLineThickness);
                translate(p1[i]) point(controlLineThickness);
            }
        }
    }
}


//END: use <Bezier.scad>;



module dummy(){}

precision = 0.1;
extraDepth = extraTroughs?troughDepth:0;
fullDepth = depth+minWidth+extraDepth;

nudge = 0.001;

module side() {
    path = Bezier(
        [[minWidth,minWidth],POLAR(minWidth/2,180),POLAR(minWidth/2,-90),[0,minWidth+lip/2],POLAR(minWidth/2,90), POLAR(minWidth/2,0), [0,minWidth+lip],POLAR(minWidth,180),POLAR(minWidth/2,90),[-minWidth,minWidth],SYMMETRIC(),POLAR(minWidth/2,180),[0,0],LINE(),LINE(),[depth+extraDepth,0],POLAR(minWidth,0),POLAR(minWidth/2,-90),[fullDepth,minWidth],LINE(),LINE(),[fullDepth,minWidth+height],POLAR(minWidth/3,90),POLAR(minWidth/3,0),[depth+minWidth/2,minWidth+height+minWidth/2],POLAR(minWidth/3,180),POLAR(minWidth/3,90),[depth,minWidth+height],POLAR(height/3,-90),POLAR(height/3,0),[bottomSpacing,minWidth]
    ],precision=-precision);

    function findTop(path,n=0,soFar=undef) =
        n>=len(path) ? soFar[0] :
        n==0 ? findTop(path,n=1,soFar=[0,path[0][1]]) :
        findTop(path,n=n+1,soFar=path[n][1]>=soFar[1] ? [n,path[n][1]] : soFar);

    function findY(path,y,n=0,closest=[0,-100000]) =
        n>=len(path) ? closest[0] :
        abs(path[n][1]-y)<abs(closest[1]-y) ? findY(path,y,n=n+1,closest=[n,path[n][1]]) :
        findY(path,y,n=n+1,closest=closest);

    difference() {
    polygon(path);
        translate([depth+extraDepth-thickness-2*tolerance,-nudge]) square([thickness+2*tolerance,supportHeight1/2+tolerance]);
        translate([depth*0.6,-nudge]) square([thickness+2*tolerance,supportHeight2/2+tolerance]);
        top = findTop(path);
        for(i=[0:1:extraTroughs-1]) {
            pos = path[findY(path,path[top][1]-minWidth-troughDepth-(troughDepth*2+minWidth/2)*i,n=top)];
            translate(pos) circle(r=troughDepth,$fn=32);
        }
    }
}

module support(supportHeight) {
    w = minWidth*2+supportSpacing+thickness*2+4*tolerance;
    difference() {
        square([w,supportHeight]);
        for (i=[0,1])
        translate([minWidth+i*(supportSpacing+thickness+2*tolerance),supportHeight/2+nudge-tolerance]) square([thickness+2*tolerance,supportHeight]);
        if (additive)
        translate([w/2,supportHeight/2]) circle(d=supportHeight-2*minWidth,$fn=32);
    }
}

module sides() {
    side();
    if (includeSides != 1)
    translate([2*fullDepth+10,0])
    mirror([1,0]) side();
}

module full()
{
    if (includeSides) translate([minWidth,includeSupports ? supportHeight1+10 : 0]) sides();
    if (includeSupports) {
        support(supportHeight1);
        translate(includeSides ? [supportSpacing+2*minWidth+thickness*2+tolerance*2+10,0] : [0,supportHeight1+10]) support(supportHeight2);
    }
}

if  (additive)
    linear_extrude(height=thickness)  full();
else
    full();
